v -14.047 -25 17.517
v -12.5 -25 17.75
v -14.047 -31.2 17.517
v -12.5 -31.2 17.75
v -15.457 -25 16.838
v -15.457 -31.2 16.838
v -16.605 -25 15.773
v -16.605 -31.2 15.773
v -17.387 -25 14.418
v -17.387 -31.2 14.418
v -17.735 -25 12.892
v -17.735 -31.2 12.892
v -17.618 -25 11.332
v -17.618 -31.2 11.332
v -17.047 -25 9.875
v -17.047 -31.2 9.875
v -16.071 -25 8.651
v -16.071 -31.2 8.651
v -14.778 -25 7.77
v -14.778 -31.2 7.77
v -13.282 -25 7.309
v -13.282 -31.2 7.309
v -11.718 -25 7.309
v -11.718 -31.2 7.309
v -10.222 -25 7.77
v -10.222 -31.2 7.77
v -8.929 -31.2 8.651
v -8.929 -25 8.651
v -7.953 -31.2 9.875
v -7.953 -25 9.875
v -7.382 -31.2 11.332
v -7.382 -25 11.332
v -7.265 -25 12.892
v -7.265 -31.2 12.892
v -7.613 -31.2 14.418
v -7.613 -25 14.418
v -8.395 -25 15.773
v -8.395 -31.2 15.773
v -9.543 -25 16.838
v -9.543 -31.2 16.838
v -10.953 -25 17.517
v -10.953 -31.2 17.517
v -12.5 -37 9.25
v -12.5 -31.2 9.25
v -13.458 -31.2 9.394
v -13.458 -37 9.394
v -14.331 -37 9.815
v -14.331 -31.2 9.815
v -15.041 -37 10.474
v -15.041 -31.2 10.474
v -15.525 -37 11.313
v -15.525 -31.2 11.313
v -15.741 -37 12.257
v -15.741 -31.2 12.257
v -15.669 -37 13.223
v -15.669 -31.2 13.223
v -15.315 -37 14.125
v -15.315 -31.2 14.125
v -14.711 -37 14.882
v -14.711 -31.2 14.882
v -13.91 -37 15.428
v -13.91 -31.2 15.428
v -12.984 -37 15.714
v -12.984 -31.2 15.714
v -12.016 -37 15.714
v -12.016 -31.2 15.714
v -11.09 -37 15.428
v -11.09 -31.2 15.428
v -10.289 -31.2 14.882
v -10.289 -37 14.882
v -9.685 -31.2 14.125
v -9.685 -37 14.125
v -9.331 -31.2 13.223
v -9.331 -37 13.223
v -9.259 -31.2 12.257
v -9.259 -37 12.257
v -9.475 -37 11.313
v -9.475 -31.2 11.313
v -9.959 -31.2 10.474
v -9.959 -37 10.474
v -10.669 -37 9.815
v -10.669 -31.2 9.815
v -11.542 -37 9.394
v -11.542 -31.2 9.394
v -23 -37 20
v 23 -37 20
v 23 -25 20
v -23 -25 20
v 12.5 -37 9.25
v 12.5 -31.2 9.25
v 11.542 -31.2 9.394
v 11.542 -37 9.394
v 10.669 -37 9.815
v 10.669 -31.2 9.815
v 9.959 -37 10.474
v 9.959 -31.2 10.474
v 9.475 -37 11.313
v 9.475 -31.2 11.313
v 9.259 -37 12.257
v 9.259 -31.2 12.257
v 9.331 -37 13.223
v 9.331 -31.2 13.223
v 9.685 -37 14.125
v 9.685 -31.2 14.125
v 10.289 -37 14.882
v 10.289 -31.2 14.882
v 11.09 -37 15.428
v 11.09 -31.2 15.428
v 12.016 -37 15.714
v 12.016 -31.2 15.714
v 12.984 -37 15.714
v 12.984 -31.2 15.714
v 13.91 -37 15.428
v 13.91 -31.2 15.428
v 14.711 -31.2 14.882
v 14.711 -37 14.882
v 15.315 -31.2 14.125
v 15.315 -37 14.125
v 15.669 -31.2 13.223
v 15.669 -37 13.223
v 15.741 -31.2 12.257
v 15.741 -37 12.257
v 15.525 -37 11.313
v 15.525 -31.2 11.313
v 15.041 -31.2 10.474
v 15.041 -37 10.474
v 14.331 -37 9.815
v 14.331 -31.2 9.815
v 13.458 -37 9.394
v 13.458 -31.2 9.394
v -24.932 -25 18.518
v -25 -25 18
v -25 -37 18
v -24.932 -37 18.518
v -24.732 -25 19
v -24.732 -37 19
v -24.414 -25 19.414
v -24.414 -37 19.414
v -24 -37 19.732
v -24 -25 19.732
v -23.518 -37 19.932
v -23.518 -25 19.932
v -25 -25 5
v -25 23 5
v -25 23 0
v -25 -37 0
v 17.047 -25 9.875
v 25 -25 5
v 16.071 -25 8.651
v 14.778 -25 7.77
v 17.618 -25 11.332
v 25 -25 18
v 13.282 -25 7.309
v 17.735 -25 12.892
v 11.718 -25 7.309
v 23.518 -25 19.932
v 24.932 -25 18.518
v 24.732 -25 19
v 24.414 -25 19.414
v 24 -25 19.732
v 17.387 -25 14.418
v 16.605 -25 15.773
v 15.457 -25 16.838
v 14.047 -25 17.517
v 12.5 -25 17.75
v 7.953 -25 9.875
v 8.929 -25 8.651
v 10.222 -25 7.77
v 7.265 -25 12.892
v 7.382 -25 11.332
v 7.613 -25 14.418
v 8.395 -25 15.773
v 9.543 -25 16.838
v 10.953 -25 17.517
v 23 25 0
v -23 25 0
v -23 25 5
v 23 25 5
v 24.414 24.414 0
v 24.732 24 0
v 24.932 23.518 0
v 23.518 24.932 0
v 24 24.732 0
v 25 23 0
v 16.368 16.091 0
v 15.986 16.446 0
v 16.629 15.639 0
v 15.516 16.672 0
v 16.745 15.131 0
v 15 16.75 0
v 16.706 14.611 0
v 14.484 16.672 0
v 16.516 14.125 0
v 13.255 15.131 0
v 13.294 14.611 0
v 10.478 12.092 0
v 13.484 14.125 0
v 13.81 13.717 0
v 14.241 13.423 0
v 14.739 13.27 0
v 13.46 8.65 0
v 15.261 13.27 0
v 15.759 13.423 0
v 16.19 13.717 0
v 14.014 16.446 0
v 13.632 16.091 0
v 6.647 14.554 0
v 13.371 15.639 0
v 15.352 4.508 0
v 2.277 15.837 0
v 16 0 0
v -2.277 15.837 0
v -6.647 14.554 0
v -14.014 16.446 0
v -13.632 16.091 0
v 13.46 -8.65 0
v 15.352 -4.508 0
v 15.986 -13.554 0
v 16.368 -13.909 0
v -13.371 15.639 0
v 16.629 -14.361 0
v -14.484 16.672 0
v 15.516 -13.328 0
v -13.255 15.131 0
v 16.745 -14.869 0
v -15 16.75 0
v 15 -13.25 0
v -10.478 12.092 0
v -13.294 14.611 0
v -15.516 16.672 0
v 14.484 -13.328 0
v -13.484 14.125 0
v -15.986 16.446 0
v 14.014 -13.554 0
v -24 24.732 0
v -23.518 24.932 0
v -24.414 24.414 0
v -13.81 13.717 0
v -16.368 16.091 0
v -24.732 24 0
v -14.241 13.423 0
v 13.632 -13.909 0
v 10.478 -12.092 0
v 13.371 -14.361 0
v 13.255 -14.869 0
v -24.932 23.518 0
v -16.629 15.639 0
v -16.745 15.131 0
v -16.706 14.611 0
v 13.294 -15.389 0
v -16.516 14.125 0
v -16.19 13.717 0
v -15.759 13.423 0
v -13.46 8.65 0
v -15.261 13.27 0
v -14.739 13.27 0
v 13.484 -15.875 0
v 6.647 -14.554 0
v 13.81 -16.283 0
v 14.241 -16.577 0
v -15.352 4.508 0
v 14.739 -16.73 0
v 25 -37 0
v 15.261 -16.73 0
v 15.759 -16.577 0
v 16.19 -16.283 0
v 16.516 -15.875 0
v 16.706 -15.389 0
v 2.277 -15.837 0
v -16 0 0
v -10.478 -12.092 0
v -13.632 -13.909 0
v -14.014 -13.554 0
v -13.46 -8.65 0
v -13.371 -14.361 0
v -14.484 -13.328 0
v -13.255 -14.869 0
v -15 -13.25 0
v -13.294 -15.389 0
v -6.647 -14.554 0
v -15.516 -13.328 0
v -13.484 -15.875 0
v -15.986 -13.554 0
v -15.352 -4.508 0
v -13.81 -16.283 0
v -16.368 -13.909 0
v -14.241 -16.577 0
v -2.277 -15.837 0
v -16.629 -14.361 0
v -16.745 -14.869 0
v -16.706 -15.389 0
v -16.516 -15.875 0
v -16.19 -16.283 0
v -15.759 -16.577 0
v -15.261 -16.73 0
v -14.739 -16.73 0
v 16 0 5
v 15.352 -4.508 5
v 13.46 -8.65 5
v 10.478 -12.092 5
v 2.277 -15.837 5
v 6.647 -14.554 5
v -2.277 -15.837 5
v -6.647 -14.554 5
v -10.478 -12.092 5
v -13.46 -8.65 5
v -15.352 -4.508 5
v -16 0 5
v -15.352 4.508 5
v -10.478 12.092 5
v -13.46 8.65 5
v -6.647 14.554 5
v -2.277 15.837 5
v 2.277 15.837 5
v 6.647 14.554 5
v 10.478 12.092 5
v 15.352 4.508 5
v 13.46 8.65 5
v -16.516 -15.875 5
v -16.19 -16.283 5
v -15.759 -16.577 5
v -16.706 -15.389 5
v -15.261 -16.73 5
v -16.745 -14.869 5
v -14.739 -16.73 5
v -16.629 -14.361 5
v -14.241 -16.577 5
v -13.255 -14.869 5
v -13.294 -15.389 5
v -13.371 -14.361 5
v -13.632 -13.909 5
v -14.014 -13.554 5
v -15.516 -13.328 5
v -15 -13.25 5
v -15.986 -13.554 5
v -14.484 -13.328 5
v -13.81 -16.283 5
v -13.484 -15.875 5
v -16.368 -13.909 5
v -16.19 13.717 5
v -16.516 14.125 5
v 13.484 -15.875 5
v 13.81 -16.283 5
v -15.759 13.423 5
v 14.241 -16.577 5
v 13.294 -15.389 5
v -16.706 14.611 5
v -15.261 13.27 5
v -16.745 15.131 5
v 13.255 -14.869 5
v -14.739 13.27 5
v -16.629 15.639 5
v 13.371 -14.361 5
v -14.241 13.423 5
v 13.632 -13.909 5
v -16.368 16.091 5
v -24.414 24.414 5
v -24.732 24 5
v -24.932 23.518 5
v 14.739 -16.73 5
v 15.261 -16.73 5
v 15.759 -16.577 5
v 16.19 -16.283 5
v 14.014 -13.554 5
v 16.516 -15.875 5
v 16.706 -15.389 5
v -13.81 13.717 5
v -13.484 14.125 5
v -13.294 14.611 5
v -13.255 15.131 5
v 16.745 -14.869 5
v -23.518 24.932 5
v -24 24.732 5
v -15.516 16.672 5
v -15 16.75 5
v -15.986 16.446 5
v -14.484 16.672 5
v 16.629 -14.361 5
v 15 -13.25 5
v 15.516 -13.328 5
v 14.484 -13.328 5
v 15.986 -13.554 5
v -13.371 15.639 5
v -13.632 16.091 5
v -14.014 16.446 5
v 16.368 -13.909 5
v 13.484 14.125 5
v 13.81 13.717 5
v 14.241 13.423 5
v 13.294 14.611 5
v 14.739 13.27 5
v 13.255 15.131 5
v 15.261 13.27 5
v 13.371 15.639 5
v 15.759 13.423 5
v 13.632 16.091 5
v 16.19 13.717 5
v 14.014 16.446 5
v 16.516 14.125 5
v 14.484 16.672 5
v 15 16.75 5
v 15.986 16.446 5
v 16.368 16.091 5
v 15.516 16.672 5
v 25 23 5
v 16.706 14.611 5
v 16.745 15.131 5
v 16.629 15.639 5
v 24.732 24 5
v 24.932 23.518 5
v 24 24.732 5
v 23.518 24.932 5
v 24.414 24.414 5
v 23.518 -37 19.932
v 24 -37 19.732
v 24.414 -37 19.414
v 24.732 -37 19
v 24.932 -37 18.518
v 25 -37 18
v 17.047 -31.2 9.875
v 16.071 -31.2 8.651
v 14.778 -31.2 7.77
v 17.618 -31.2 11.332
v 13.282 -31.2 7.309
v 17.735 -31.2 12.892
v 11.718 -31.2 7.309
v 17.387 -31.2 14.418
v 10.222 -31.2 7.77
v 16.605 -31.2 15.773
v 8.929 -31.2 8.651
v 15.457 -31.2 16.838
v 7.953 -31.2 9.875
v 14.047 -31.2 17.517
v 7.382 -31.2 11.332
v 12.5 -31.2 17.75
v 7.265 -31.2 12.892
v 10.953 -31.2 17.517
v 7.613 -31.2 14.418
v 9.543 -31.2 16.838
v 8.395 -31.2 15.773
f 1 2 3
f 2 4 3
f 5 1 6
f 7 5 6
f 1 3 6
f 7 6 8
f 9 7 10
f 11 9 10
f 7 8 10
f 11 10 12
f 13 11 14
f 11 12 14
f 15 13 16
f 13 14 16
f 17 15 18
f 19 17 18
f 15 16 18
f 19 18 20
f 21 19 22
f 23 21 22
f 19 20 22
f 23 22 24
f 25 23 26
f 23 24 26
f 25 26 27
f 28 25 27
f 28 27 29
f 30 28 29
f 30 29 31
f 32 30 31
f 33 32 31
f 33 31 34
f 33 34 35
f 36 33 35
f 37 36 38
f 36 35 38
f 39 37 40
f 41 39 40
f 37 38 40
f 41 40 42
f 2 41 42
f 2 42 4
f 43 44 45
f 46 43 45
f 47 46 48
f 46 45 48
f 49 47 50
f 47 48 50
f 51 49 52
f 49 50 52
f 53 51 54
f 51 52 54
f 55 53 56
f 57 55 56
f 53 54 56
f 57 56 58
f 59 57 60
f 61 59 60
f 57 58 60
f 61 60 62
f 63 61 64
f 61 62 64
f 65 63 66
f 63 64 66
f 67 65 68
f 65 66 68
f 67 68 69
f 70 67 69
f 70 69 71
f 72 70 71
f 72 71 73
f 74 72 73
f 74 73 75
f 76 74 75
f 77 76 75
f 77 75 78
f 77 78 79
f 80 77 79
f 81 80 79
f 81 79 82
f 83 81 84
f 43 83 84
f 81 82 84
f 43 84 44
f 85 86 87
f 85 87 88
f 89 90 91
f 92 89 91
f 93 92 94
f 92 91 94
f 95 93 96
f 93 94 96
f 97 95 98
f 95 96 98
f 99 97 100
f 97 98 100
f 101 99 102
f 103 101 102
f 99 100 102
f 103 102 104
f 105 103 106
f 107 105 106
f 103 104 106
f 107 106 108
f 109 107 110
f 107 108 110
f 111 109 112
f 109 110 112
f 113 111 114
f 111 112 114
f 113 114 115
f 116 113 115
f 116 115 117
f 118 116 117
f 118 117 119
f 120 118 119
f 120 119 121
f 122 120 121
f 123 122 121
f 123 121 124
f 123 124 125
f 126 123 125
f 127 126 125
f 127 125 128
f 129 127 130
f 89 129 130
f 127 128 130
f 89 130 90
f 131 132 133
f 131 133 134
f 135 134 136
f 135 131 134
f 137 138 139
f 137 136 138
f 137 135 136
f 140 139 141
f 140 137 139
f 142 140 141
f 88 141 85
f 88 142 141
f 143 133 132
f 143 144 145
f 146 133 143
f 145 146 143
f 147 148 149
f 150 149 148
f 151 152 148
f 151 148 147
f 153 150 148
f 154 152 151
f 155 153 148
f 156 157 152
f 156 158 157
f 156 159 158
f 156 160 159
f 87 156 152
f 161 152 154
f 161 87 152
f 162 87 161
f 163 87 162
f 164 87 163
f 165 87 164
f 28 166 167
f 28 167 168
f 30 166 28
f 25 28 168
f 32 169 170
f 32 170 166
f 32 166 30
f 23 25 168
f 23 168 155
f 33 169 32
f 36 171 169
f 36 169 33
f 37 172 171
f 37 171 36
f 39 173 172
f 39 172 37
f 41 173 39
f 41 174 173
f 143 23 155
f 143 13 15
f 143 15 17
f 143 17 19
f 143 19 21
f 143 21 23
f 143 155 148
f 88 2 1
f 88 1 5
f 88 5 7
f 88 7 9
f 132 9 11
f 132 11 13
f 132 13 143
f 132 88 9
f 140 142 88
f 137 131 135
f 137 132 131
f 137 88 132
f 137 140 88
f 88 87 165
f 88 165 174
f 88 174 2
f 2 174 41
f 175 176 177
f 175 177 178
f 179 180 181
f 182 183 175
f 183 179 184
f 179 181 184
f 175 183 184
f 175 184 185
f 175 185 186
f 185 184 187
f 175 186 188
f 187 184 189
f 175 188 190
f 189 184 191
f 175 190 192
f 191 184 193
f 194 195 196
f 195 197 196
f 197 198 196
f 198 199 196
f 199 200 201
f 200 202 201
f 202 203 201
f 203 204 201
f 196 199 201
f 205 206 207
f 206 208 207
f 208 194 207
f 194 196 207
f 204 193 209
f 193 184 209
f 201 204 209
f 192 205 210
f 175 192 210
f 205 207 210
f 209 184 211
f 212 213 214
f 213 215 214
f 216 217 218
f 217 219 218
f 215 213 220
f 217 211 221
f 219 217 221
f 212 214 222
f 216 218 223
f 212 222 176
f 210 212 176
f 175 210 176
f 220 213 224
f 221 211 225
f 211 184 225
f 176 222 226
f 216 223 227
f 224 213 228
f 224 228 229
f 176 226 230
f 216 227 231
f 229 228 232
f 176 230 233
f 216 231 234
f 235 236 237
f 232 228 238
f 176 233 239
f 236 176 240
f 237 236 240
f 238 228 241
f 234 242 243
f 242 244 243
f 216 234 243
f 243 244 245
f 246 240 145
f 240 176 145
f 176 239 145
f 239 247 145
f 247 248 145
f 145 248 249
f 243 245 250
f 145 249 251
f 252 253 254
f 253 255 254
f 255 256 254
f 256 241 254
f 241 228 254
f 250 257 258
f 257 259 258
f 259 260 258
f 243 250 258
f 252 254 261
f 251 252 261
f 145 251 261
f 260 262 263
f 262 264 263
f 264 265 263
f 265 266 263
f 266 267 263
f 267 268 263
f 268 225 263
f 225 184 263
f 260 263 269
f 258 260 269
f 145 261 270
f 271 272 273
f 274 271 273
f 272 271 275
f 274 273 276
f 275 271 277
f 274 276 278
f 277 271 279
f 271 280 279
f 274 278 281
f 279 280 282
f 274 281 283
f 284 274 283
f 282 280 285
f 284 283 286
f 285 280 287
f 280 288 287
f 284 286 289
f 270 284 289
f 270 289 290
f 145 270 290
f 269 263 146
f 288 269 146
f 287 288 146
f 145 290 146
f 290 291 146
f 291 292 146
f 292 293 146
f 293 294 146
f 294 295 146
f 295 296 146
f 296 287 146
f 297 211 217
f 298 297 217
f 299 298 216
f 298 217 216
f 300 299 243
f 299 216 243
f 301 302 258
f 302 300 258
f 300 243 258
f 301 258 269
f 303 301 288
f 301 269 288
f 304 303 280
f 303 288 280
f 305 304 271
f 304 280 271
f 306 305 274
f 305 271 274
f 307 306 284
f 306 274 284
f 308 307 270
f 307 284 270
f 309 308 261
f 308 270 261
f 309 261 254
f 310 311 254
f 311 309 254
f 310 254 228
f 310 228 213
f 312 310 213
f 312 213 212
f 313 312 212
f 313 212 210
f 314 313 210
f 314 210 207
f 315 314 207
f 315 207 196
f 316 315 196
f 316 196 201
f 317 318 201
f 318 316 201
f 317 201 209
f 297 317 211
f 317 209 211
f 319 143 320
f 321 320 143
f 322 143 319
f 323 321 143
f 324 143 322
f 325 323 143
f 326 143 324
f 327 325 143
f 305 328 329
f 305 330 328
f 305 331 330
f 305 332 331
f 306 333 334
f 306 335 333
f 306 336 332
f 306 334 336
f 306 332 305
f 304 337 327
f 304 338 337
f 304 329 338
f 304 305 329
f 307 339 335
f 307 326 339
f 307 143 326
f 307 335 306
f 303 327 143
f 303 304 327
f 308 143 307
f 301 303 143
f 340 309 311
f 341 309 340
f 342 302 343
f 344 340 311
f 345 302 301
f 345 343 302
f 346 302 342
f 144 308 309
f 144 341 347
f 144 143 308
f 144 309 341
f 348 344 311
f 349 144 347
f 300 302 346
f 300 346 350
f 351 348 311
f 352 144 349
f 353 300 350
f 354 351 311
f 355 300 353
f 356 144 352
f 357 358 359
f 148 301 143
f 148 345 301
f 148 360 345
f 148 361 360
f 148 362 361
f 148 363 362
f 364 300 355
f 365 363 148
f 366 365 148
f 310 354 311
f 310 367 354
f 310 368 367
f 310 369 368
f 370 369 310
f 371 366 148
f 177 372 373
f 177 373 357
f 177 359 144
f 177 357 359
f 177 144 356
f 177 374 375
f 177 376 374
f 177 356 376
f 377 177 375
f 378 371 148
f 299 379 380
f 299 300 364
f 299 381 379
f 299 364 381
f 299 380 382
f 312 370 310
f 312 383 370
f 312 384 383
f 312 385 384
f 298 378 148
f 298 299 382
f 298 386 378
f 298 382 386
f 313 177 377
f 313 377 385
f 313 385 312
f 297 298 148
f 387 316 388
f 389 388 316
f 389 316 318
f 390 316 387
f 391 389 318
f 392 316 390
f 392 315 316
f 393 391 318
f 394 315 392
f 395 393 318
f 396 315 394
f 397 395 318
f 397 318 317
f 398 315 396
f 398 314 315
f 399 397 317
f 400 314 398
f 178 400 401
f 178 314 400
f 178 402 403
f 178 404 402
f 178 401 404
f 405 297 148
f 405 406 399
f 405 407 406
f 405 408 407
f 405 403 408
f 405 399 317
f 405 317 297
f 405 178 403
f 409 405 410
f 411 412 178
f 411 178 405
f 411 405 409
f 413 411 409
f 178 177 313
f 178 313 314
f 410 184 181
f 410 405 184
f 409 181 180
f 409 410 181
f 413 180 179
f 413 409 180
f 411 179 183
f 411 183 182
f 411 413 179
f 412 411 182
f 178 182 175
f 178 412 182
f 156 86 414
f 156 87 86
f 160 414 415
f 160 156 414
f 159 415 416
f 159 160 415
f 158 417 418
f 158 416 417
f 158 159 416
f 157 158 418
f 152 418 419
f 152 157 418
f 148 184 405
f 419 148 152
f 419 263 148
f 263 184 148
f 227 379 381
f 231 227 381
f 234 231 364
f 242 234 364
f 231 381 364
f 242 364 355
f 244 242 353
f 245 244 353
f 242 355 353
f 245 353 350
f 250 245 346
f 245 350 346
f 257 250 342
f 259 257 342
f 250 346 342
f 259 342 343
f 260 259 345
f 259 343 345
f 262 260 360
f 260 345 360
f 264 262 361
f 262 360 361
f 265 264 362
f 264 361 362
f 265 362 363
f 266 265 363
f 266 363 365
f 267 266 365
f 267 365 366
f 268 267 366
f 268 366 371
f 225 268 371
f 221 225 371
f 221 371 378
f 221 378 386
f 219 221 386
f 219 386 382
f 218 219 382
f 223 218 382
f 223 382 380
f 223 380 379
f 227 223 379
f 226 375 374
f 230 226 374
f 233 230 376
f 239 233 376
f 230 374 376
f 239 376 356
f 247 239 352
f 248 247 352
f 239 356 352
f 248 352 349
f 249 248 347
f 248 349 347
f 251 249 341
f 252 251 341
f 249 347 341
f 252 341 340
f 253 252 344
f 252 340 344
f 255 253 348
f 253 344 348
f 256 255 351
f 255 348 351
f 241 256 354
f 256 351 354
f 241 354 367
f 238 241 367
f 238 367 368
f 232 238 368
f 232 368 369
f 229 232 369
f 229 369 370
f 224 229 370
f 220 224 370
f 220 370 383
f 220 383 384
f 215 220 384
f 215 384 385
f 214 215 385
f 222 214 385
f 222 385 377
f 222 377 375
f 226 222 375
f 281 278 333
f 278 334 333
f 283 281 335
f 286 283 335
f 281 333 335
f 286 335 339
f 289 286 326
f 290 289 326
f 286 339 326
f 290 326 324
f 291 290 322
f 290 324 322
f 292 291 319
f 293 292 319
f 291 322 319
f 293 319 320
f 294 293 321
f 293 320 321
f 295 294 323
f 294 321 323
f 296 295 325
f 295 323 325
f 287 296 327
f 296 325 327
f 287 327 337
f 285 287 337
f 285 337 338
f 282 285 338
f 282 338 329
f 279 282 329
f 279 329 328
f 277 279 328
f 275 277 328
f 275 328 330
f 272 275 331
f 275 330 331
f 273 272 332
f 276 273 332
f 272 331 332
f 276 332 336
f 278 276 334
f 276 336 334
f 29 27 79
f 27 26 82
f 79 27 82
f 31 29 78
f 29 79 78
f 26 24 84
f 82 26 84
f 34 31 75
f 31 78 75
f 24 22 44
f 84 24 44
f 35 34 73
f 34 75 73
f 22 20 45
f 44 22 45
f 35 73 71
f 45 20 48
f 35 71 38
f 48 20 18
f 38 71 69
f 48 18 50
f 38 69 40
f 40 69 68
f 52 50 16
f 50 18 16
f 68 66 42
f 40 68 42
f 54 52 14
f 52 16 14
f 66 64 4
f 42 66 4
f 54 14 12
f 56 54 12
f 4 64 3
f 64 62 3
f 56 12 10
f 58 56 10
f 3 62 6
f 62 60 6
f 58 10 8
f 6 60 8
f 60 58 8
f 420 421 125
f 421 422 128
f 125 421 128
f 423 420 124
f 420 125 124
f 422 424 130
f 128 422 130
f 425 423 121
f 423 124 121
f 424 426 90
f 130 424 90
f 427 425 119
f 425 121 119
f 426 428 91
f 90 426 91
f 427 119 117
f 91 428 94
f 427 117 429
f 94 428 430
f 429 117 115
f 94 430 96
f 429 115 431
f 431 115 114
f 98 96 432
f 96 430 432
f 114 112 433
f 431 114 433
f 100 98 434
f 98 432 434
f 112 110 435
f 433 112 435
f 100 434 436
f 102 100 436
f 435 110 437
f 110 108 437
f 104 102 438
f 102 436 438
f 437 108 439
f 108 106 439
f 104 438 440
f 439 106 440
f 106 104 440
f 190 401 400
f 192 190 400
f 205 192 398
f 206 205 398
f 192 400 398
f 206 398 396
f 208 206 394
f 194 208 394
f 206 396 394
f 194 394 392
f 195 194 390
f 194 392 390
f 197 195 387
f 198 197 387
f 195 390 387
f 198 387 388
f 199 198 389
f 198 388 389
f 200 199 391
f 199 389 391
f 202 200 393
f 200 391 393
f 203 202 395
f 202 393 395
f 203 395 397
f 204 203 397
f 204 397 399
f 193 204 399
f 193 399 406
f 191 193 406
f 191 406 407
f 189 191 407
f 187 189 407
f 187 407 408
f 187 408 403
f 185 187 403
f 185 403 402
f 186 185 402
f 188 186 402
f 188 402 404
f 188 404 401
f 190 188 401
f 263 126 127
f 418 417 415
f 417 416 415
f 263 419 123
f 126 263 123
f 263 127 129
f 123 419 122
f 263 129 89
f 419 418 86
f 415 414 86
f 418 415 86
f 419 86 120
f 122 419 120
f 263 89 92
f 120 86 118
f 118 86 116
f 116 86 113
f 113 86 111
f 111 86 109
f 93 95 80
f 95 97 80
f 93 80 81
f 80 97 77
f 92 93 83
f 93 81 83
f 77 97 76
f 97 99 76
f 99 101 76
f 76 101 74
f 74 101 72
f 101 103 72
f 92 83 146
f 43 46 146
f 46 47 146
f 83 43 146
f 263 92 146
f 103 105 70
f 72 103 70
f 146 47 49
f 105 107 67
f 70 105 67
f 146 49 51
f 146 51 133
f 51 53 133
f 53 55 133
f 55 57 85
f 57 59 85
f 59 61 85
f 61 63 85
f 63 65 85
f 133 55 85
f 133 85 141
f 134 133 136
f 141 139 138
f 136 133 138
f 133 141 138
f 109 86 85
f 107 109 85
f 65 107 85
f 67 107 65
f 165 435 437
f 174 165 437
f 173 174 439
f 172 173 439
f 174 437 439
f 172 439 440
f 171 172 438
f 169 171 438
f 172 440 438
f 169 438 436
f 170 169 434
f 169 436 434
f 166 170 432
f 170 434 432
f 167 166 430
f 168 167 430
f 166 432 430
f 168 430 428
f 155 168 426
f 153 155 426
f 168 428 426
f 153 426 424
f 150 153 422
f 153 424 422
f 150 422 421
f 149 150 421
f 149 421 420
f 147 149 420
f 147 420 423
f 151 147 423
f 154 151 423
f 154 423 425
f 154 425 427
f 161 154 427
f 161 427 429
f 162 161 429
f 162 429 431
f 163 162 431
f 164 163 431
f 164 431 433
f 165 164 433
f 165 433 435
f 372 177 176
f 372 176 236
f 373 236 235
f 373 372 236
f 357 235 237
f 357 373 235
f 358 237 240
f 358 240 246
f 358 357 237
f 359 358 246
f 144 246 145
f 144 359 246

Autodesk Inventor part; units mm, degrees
ref_plane "YZ Plane" through (0, 0, 0) normal (1, 0, 0) x (0, 1, 0)
ref_plane "XY Plane" through (0, 0, 0) normal (0, 0, 1) x (1, 0, 0)
sketch "Sketch1" plane through (0, 0, 0) normal (0, 0, 1) x (1, 0, 0)
  circle A0 centre (0, 0) radius 16
  line L0 (25, -25) -> (-25, -25)
  line L1 (-25, -25) -> (-25, 25)
  line L2 (-25, 25) -> (25, 25)
  line L3 (25, 25) -> (25, -25)
  line L4 (25, -25) -> (-25, 25) construction
  line L5 (-25, -25) -> (25, 25) construction
  point P0 (-15, 15)
  point P1 (15, 15)
  point P2 (-15, -15)
  point P3 (15, -15)
  dimension "d0" = 32
  dimension "d1" = 50
  dimension "d2" = 50
  dimension "d5" = 30
  dimension "d8" = 30
extrude "Extrusion1" add sketch "Sketch1" along normal blind 5
hole "Hole1" at (-15, 15, 0) at (15, 15, 0) at (-15, -15, 0) at (15, -15, 0) direction (0, 0, 1) diameter 3.5 end through all
ref_plane "Work Plane1" through (0, -37, 0) normal (0, 1, 0) x (-1, 0, 0)
sketch "Sketch2" plane through (0, -37, 0) normal (0, 1, 0) x (-1, 0, 0)
  line L0 (-25, 0) -> (25, 0) projected
  line L1 (-25, 0) -> (-25, 5) projected
  line L2 (25, 0) -> (-25, 0)
  line L3 (-25, 0) -> (-25, 20)
  line L4 (-25, 20) -> (25, 20)
  line L5 (25, 20) -> (25, 0)
  point P0 (0, 0)
  point P1 (12.5, 12.5)
  point P2 (-12.5, 12.5)
  dimension "d21" = 20
  dimension "d24" = 25
  dimension "d46" = 12.5
extrude "Extrusion2" add sketch "Sketch2" along normal up to surface (12 mm away)
hole "Hole2" at (12.5, -37, 12.5) at (-12.5, -37, 12.5) direction (0, 1, 0) diameter 6.5 end through all
fillet "Fillet1" radius 2 4 edges at (25, 25, 2.5) (-25, 25, 2.5) (25, -31, 20) (-25, -31, 20)
sketch "Sketch5" plane through (-25, -25, 5) normal (0, 1, 0) x (1, 0, 0)
  point P0 (25, 5)
  point P1 (12.5, -7.5)
  point P2 (37.5, -7.5)
hole "Hole4" at (-12.5, -25, 12.5) at (12.5, -25, 12.5) direction (0, -1, 0) diameter 10.5 depth 6.2
properties part number "mirror-bracket"
